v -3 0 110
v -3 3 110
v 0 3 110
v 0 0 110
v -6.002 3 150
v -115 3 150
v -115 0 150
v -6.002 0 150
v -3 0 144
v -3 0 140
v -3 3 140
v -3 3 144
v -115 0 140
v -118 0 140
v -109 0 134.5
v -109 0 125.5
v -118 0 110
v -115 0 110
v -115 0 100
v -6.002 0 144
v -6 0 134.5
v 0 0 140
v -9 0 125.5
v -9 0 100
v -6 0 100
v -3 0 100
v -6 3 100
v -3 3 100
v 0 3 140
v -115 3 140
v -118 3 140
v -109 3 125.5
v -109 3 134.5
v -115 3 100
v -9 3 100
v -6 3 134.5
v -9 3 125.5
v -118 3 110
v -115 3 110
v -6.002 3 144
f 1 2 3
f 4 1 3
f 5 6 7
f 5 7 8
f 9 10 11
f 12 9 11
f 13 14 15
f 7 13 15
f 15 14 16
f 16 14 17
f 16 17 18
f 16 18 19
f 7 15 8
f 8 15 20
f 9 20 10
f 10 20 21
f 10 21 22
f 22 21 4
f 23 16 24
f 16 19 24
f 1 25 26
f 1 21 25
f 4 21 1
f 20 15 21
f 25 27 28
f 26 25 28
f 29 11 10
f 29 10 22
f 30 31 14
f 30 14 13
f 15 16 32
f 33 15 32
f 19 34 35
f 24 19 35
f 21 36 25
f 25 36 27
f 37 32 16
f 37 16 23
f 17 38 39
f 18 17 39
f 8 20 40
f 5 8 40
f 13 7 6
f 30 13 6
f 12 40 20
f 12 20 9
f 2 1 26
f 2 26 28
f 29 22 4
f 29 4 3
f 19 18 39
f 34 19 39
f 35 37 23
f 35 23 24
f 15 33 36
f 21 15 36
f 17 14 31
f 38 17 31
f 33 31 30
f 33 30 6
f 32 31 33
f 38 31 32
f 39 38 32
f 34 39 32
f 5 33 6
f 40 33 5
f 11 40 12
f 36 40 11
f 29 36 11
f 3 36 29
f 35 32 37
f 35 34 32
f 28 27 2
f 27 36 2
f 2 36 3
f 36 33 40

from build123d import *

# Parameters (mm, degrees)
LED_1_START         = 100
LED_1_OUTLINE_W     = 112
LED_1_OUTLINE_H     = 3
LED_1_DEPTH         = 25.5
LED_1_START_2       = 134.5
LED_1_2_OUTLINE_W   = 108.998029847
LED_1_2_OUTLINE_H   = 3
LED_1_2_DEPTH       = 15.5
LED_1_START_3       = 110
LED_1_3_OUTLINE_W   = 9
LED_1_3_OUTLINE_H   = 3
LED_1_3_DEPTH       = 30
LED_1_START_4       = 140
LED_1_4_OUTLINE_W   = 3.001970153
LED_1_4_OUTLINE_H   = 3
LED_1_4_DEPTH       = 4
SKETCH_1_W          = 3
SKETCH_1_H          = 34.5
CUT_EXTRUDE_1_DEPTH = 3


# Read off the part's stored shape, not the designer's step: 基体零件-LED限位板-1
with BuildPart() as part:
    # 基体零件-LED限位板-1 outline → 基体零件-LED限位板-1 (new body)
    with BuildSketch(Plane.XY.offset(LED_1_START)):
        with Locations((-59, 1.5)):
            Rectangle(LED_1_OUTLINE_W, LED_1_OUTLINE_H)
    extrude(amount=LED_1_DEPTH)



with BuildPart() as body_2:
    # LED_-1 2 outline → LED_-1 2 (new body)
    with BuildSketch(Plane.XY.offset(LED_1_START_2)):
        with Locations((-60.500985077, 1.5)):
            Rectangle(LED_1_2_OUTLINE_W, LED_1_2_OUTLINE_H)
    extrude(amount=LED_1_2_DEPTH)


with BuildPart() as part_1:
    add(part.part)

    add(body_2.part)  # LED_-1 3 merges body 2
    # LED_-1 3 outline → LED_-1 3 (add)
    with BuildSketch(Plane.XY.offset(LED_1_START_3)):
        with Locations((-113.5, 1.5)):
            Rectangle(LED_1_3_OUTLINE_W, LED_1_3_OUTLINE_H)
        with Locations((-4.5, 1.5)):
            Rectangle(LED_1_3_OUTLINE_W, LED_1_3_OUTLINE_H)
    extrude(amount=LED_1_3_DEPTH)

    # LED_-1 4 outline → LED_-1 4 (add)
    with BuildSketch(Plane.XY.offset(LED_1_START_4)):
        with Locations((-4.500985077, 1.5)):
            Rectangle(LED_1_4_OUTLINE_W, LED_1_4_OUTLINE_H)
    extrude(amount=LED_1_4_DEPTH)

    # 草图1 → 切除-拉伸1 (cut)
    with BuildSketch(Plane(origin=(0, 3, 0), x_dir=(1, 0, 0), z_dir=(0, 1, 0))):
        with Locations((-7.5, -117.25)):
            Rectangle(SKETCH_1_W, SKETCH_1_H)
    extrude(amount=-CUT_EXTRUDE_1_DEPTH, mode=Mode.SUBTRACT)


solid = part_1.part
